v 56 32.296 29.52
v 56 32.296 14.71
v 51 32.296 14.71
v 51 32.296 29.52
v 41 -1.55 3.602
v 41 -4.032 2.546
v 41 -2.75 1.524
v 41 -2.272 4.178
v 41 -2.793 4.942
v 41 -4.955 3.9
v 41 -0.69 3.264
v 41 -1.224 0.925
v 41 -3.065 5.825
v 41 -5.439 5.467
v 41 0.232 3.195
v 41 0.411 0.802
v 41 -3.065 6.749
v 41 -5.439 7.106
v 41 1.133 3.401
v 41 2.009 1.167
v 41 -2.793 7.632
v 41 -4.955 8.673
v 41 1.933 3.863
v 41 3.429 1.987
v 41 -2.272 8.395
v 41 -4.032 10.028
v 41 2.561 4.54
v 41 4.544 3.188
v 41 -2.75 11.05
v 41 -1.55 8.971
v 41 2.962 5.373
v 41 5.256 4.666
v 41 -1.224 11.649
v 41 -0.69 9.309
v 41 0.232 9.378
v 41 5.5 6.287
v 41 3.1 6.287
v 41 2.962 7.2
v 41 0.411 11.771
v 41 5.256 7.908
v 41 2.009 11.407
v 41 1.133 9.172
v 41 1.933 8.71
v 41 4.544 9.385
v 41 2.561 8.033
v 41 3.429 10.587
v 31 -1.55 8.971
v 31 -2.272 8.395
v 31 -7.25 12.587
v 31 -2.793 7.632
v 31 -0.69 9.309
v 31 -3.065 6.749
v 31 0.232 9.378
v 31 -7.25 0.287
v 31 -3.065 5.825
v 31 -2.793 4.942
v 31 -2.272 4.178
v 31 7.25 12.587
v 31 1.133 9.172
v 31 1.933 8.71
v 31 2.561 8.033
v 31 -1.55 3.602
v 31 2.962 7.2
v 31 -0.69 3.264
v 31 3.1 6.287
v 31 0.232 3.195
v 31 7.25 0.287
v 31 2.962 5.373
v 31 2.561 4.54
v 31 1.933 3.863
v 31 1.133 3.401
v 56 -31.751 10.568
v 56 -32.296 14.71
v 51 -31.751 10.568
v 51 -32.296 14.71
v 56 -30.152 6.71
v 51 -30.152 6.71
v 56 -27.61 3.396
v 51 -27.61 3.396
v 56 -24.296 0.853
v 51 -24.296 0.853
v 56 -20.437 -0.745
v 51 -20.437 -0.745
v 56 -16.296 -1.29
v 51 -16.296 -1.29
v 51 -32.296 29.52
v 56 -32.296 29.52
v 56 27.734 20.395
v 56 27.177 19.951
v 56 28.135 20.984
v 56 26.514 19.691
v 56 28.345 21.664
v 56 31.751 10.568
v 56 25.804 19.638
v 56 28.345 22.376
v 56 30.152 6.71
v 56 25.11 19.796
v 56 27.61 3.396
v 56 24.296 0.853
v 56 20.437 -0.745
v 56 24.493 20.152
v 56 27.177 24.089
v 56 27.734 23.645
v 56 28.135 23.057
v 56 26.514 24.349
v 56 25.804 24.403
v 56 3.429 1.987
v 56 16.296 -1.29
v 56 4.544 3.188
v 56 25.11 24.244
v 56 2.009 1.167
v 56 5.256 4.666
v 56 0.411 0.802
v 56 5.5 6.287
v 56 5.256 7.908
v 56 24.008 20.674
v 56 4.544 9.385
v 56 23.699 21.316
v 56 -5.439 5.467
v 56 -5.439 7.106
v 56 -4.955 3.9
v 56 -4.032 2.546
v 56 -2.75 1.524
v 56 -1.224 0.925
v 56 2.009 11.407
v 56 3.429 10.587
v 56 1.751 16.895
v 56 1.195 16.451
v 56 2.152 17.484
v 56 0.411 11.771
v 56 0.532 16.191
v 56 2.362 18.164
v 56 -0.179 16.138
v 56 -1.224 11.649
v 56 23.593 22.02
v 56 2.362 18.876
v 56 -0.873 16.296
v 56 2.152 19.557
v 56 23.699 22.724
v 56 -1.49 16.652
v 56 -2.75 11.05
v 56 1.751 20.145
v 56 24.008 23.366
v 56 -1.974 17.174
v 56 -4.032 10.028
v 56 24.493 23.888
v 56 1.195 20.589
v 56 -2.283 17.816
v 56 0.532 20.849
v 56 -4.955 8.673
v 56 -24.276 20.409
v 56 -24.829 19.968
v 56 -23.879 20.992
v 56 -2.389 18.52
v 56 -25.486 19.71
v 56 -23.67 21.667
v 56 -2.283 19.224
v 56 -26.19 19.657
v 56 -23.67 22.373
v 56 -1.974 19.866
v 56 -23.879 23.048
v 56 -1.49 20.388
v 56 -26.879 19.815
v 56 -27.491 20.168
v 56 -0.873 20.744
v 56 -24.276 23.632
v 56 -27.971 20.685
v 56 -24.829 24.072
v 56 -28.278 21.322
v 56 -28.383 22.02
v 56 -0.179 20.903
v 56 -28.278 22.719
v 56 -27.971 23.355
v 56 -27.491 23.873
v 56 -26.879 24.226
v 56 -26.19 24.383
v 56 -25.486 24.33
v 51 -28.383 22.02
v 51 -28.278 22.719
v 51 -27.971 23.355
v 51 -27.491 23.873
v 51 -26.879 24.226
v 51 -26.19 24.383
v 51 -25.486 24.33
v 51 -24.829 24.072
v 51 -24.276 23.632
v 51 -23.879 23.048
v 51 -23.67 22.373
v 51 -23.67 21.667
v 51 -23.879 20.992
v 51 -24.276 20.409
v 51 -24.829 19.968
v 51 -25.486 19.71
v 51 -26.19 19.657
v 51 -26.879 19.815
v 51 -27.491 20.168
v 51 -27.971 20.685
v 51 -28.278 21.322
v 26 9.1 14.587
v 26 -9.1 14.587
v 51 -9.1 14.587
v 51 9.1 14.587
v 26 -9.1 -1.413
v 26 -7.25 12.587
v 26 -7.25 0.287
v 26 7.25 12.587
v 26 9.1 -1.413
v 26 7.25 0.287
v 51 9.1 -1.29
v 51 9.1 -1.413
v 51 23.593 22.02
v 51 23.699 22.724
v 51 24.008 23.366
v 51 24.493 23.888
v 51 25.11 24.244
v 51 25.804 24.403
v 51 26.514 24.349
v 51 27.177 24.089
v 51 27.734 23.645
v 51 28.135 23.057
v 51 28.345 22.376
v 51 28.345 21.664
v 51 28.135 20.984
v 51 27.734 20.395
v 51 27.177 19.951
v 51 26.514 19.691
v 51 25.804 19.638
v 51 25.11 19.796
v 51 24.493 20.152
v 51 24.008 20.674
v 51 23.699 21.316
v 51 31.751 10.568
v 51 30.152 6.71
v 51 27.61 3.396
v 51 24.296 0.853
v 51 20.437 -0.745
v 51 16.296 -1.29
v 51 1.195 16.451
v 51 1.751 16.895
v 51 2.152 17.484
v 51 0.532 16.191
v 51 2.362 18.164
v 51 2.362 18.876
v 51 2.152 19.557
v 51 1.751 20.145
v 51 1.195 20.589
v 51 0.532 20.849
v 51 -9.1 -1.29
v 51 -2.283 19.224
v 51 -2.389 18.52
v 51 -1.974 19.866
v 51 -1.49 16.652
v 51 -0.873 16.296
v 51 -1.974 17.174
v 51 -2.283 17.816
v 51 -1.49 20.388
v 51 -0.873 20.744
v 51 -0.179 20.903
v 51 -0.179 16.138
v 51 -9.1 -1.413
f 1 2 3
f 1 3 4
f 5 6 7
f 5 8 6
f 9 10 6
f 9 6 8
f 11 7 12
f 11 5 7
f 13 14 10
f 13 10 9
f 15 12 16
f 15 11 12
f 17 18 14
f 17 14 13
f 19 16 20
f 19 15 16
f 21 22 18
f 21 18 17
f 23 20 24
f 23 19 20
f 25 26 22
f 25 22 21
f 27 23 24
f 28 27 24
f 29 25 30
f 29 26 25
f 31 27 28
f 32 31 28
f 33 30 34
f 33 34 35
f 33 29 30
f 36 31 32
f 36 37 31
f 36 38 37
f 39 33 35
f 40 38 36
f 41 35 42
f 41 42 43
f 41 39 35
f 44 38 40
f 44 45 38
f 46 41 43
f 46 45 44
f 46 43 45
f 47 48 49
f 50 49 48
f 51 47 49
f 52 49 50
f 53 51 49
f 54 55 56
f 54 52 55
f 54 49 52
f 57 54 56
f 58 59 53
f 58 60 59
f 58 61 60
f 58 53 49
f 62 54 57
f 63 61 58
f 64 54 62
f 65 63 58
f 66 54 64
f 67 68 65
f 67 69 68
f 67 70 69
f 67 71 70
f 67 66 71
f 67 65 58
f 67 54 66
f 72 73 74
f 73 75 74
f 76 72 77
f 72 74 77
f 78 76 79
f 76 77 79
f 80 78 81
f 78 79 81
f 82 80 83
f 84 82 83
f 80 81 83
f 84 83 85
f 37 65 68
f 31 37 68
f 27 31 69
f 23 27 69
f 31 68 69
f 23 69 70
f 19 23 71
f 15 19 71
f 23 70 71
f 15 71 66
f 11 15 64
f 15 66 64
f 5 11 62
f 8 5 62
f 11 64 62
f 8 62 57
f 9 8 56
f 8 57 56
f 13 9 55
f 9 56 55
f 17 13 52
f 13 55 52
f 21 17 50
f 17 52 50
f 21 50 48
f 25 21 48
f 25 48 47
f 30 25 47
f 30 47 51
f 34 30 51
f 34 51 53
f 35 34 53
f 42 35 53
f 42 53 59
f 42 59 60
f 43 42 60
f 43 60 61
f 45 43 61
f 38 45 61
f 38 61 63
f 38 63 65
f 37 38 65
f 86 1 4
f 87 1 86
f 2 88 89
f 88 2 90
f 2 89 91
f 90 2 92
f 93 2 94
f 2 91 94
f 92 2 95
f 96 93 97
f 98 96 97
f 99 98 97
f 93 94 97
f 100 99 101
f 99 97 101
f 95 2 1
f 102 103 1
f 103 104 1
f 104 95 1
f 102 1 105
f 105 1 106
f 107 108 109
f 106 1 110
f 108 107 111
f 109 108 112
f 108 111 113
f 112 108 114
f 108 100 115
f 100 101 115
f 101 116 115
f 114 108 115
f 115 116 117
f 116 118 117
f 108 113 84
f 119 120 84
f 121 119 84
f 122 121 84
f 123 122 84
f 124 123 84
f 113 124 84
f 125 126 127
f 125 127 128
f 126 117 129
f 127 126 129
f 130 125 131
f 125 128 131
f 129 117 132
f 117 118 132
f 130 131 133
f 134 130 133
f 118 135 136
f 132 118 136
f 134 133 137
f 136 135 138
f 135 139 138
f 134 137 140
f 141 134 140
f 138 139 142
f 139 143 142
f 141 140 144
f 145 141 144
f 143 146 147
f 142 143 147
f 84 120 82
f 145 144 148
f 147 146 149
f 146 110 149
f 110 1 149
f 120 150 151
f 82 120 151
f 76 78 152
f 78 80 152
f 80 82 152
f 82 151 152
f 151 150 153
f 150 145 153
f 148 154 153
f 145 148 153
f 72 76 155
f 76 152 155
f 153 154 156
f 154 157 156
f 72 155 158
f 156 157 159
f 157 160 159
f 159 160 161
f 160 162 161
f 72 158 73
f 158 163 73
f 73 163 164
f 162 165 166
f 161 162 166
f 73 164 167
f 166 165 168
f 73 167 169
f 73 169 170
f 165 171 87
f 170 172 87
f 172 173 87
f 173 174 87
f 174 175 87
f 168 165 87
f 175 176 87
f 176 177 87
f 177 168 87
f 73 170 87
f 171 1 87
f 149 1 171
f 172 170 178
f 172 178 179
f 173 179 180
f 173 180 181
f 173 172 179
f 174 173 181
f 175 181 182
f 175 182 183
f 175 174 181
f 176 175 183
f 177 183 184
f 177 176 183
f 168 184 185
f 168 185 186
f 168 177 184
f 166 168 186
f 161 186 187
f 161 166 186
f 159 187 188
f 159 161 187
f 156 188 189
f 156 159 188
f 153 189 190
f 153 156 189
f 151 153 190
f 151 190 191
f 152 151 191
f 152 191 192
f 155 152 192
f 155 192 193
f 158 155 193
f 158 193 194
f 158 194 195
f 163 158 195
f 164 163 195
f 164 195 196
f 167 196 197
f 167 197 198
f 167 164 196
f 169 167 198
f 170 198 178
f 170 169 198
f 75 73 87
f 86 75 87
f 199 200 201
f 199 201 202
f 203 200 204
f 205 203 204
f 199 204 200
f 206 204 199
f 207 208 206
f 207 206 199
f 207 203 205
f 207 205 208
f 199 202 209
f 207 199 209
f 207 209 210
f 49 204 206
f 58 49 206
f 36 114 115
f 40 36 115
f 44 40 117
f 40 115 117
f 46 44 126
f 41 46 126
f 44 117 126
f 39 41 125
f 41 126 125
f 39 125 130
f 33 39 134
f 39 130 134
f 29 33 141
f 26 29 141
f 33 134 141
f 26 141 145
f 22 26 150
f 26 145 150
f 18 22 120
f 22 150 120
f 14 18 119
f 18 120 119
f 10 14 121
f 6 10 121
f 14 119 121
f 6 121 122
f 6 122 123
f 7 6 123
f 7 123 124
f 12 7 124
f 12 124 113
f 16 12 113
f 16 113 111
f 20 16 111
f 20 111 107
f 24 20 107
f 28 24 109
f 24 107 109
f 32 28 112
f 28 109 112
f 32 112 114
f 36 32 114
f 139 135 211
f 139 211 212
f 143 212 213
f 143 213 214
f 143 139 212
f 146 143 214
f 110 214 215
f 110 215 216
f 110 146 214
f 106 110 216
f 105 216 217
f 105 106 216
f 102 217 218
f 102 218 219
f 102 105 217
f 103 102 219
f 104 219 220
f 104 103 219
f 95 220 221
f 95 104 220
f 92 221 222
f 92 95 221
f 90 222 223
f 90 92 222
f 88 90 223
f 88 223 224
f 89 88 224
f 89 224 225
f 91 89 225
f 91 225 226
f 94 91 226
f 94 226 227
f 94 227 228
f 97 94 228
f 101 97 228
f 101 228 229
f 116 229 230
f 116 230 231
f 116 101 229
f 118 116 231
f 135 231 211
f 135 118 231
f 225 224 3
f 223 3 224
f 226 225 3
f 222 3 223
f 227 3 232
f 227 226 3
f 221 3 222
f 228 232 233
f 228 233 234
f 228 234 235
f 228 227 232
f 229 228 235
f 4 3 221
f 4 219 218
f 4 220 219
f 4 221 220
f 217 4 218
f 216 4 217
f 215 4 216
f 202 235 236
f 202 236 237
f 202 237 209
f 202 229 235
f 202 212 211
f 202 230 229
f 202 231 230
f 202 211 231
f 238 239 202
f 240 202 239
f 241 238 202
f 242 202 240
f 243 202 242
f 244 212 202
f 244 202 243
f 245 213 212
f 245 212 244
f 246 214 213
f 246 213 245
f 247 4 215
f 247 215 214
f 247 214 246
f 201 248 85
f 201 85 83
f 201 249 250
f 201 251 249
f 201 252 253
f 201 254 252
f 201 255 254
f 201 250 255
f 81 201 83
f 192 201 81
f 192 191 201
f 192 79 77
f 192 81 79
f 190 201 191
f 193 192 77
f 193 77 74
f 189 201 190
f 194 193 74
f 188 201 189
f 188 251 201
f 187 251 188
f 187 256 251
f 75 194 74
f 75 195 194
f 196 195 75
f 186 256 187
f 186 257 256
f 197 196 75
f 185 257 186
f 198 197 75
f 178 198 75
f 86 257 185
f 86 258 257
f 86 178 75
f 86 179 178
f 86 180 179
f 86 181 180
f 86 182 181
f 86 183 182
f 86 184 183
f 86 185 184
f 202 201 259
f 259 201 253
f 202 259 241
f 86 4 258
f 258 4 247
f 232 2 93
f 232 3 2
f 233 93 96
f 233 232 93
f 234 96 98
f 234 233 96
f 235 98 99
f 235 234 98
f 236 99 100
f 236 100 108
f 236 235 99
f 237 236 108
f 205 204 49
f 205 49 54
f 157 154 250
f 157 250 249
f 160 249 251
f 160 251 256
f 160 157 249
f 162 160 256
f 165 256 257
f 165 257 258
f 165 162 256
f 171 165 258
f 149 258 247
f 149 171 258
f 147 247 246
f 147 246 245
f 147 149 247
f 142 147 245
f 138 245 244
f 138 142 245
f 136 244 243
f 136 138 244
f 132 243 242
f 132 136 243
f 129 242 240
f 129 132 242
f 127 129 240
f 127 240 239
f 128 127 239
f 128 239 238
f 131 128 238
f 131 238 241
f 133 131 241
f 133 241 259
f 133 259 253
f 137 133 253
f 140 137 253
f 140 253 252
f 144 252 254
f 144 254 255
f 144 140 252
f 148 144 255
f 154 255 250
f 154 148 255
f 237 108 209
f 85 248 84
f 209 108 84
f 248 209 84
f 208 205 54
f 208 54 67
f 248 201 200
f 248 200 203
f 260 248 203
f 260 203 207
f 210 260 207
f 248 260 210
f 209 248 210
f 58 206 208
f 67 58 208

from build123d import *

# Parameters (mm, degrees)
SKETCH_W        = 64.59174
SKETCH_H        = 30.810671
SKETCH_R        = 2.389077
SKETCH_R_2      = 2.369482
PAD001_DEPTH    = 5
SKETCH001_W     = 18.2
SKETCH001_H     = 16
PAD002_DEPTH    = 25
SKETCH002_W     = 14.5
SKETCH002_H     = 12.3
POCKET_DEPTH    = 5
SKETCH003_R     = 3.1
POCKET001_DEPTH = 25.001
SKETCH004_R     = 5.5
POCKET002_DEPTH = 15
FILLET_R        = 16


with BuildPart() as part:
    # Sketch → Pad001 (new body)
    with BuildSketch(Plane(origin=(0, 0, 0), x_dir=(0, -1, 0), z_dir=(-1, 0, 0))):
        with Locations((0, 14.114935)):
            Rectangle(SKETCH_W, SKETCH_H)
        with Locations((-25.982353, 22.020271)):
            Circle(SKETCH_R, mode=Mode.SUBTRACT)
        with Locations((26.01334, 22.020271)):
            Circle(SKETCH_R_2, mode=Mode.SUBTRACT)
        with Locations((0, 18.520271)):
            Circle(SKETCH_R, mode=Mode.SUBTRACT)
    extrude(amount=PAD001_DEPTH)

    # Sketch001 (on Face9 of Pad001) → Pad002 (join)
    with BuildSketch(Plane(origin=(-5, 0, -1.2), x_dir=(0, 1, 0), z_dir=(-1, 0, 0))):
        with Locations((0, -7.786735)):
            Rectangle(SKETCH001_W, SKETCH001_H)
    extrude(amount=PAD002_DEPTH)

    # Sketch002 (on Face15 of Pad002) → Pocket (cut)
    with BuildSketch(Plane(origin=(-30, 0, 0), x_dir=(0, 1, 0), z_dir=(-1, 0, 0))):
        with Locations((0, -6.436735)):
            Rectangle(SKETCH002_W, SKETCH002_H)
    extrude(amount=-POCKET_DEPTH, mode=Mode.SUBTRACT)

    # Sketch003 (on Face20 of Pocket) → Pocket001 (cut, through all)
    with BuildSketch(Plane(origin=(-25, 0, 0), x_dir=(0, 1, 0), z_dir=(-1, 0, 0))):
        with Locations((0, -6.286735)):
            Circle(SKETCH003_R)
    extrude(amount=-POCKET001_DEPTH, mode=Mode.SUBTRACT)

    # Sketch004 (on Face4 of Pocket001) → Pocket002 (cut)
    with BuildSketch(Plane.YZ):
        with Locations((0, 6.286735)):
            Circle(SKETCH004_R)
    extrude(amount=-POCKET002_DEPTH, mode=Mode.SUBTRACT)

    # Fillet
    fillet_edges = [part.edges().sort_by_distance(p)[0] for p in [
        (-2.5, -32.29587, -1.2904),
        (-2.5, 32.29587, -1.2904),
    ]]
    fillet(fillet_edges, radius=FILLET_R)


with BuildPart() as part_1:
    # Body placement: moved
    add(part.part.moved(Location((56, 0, 0))))


solid = part_1.part
